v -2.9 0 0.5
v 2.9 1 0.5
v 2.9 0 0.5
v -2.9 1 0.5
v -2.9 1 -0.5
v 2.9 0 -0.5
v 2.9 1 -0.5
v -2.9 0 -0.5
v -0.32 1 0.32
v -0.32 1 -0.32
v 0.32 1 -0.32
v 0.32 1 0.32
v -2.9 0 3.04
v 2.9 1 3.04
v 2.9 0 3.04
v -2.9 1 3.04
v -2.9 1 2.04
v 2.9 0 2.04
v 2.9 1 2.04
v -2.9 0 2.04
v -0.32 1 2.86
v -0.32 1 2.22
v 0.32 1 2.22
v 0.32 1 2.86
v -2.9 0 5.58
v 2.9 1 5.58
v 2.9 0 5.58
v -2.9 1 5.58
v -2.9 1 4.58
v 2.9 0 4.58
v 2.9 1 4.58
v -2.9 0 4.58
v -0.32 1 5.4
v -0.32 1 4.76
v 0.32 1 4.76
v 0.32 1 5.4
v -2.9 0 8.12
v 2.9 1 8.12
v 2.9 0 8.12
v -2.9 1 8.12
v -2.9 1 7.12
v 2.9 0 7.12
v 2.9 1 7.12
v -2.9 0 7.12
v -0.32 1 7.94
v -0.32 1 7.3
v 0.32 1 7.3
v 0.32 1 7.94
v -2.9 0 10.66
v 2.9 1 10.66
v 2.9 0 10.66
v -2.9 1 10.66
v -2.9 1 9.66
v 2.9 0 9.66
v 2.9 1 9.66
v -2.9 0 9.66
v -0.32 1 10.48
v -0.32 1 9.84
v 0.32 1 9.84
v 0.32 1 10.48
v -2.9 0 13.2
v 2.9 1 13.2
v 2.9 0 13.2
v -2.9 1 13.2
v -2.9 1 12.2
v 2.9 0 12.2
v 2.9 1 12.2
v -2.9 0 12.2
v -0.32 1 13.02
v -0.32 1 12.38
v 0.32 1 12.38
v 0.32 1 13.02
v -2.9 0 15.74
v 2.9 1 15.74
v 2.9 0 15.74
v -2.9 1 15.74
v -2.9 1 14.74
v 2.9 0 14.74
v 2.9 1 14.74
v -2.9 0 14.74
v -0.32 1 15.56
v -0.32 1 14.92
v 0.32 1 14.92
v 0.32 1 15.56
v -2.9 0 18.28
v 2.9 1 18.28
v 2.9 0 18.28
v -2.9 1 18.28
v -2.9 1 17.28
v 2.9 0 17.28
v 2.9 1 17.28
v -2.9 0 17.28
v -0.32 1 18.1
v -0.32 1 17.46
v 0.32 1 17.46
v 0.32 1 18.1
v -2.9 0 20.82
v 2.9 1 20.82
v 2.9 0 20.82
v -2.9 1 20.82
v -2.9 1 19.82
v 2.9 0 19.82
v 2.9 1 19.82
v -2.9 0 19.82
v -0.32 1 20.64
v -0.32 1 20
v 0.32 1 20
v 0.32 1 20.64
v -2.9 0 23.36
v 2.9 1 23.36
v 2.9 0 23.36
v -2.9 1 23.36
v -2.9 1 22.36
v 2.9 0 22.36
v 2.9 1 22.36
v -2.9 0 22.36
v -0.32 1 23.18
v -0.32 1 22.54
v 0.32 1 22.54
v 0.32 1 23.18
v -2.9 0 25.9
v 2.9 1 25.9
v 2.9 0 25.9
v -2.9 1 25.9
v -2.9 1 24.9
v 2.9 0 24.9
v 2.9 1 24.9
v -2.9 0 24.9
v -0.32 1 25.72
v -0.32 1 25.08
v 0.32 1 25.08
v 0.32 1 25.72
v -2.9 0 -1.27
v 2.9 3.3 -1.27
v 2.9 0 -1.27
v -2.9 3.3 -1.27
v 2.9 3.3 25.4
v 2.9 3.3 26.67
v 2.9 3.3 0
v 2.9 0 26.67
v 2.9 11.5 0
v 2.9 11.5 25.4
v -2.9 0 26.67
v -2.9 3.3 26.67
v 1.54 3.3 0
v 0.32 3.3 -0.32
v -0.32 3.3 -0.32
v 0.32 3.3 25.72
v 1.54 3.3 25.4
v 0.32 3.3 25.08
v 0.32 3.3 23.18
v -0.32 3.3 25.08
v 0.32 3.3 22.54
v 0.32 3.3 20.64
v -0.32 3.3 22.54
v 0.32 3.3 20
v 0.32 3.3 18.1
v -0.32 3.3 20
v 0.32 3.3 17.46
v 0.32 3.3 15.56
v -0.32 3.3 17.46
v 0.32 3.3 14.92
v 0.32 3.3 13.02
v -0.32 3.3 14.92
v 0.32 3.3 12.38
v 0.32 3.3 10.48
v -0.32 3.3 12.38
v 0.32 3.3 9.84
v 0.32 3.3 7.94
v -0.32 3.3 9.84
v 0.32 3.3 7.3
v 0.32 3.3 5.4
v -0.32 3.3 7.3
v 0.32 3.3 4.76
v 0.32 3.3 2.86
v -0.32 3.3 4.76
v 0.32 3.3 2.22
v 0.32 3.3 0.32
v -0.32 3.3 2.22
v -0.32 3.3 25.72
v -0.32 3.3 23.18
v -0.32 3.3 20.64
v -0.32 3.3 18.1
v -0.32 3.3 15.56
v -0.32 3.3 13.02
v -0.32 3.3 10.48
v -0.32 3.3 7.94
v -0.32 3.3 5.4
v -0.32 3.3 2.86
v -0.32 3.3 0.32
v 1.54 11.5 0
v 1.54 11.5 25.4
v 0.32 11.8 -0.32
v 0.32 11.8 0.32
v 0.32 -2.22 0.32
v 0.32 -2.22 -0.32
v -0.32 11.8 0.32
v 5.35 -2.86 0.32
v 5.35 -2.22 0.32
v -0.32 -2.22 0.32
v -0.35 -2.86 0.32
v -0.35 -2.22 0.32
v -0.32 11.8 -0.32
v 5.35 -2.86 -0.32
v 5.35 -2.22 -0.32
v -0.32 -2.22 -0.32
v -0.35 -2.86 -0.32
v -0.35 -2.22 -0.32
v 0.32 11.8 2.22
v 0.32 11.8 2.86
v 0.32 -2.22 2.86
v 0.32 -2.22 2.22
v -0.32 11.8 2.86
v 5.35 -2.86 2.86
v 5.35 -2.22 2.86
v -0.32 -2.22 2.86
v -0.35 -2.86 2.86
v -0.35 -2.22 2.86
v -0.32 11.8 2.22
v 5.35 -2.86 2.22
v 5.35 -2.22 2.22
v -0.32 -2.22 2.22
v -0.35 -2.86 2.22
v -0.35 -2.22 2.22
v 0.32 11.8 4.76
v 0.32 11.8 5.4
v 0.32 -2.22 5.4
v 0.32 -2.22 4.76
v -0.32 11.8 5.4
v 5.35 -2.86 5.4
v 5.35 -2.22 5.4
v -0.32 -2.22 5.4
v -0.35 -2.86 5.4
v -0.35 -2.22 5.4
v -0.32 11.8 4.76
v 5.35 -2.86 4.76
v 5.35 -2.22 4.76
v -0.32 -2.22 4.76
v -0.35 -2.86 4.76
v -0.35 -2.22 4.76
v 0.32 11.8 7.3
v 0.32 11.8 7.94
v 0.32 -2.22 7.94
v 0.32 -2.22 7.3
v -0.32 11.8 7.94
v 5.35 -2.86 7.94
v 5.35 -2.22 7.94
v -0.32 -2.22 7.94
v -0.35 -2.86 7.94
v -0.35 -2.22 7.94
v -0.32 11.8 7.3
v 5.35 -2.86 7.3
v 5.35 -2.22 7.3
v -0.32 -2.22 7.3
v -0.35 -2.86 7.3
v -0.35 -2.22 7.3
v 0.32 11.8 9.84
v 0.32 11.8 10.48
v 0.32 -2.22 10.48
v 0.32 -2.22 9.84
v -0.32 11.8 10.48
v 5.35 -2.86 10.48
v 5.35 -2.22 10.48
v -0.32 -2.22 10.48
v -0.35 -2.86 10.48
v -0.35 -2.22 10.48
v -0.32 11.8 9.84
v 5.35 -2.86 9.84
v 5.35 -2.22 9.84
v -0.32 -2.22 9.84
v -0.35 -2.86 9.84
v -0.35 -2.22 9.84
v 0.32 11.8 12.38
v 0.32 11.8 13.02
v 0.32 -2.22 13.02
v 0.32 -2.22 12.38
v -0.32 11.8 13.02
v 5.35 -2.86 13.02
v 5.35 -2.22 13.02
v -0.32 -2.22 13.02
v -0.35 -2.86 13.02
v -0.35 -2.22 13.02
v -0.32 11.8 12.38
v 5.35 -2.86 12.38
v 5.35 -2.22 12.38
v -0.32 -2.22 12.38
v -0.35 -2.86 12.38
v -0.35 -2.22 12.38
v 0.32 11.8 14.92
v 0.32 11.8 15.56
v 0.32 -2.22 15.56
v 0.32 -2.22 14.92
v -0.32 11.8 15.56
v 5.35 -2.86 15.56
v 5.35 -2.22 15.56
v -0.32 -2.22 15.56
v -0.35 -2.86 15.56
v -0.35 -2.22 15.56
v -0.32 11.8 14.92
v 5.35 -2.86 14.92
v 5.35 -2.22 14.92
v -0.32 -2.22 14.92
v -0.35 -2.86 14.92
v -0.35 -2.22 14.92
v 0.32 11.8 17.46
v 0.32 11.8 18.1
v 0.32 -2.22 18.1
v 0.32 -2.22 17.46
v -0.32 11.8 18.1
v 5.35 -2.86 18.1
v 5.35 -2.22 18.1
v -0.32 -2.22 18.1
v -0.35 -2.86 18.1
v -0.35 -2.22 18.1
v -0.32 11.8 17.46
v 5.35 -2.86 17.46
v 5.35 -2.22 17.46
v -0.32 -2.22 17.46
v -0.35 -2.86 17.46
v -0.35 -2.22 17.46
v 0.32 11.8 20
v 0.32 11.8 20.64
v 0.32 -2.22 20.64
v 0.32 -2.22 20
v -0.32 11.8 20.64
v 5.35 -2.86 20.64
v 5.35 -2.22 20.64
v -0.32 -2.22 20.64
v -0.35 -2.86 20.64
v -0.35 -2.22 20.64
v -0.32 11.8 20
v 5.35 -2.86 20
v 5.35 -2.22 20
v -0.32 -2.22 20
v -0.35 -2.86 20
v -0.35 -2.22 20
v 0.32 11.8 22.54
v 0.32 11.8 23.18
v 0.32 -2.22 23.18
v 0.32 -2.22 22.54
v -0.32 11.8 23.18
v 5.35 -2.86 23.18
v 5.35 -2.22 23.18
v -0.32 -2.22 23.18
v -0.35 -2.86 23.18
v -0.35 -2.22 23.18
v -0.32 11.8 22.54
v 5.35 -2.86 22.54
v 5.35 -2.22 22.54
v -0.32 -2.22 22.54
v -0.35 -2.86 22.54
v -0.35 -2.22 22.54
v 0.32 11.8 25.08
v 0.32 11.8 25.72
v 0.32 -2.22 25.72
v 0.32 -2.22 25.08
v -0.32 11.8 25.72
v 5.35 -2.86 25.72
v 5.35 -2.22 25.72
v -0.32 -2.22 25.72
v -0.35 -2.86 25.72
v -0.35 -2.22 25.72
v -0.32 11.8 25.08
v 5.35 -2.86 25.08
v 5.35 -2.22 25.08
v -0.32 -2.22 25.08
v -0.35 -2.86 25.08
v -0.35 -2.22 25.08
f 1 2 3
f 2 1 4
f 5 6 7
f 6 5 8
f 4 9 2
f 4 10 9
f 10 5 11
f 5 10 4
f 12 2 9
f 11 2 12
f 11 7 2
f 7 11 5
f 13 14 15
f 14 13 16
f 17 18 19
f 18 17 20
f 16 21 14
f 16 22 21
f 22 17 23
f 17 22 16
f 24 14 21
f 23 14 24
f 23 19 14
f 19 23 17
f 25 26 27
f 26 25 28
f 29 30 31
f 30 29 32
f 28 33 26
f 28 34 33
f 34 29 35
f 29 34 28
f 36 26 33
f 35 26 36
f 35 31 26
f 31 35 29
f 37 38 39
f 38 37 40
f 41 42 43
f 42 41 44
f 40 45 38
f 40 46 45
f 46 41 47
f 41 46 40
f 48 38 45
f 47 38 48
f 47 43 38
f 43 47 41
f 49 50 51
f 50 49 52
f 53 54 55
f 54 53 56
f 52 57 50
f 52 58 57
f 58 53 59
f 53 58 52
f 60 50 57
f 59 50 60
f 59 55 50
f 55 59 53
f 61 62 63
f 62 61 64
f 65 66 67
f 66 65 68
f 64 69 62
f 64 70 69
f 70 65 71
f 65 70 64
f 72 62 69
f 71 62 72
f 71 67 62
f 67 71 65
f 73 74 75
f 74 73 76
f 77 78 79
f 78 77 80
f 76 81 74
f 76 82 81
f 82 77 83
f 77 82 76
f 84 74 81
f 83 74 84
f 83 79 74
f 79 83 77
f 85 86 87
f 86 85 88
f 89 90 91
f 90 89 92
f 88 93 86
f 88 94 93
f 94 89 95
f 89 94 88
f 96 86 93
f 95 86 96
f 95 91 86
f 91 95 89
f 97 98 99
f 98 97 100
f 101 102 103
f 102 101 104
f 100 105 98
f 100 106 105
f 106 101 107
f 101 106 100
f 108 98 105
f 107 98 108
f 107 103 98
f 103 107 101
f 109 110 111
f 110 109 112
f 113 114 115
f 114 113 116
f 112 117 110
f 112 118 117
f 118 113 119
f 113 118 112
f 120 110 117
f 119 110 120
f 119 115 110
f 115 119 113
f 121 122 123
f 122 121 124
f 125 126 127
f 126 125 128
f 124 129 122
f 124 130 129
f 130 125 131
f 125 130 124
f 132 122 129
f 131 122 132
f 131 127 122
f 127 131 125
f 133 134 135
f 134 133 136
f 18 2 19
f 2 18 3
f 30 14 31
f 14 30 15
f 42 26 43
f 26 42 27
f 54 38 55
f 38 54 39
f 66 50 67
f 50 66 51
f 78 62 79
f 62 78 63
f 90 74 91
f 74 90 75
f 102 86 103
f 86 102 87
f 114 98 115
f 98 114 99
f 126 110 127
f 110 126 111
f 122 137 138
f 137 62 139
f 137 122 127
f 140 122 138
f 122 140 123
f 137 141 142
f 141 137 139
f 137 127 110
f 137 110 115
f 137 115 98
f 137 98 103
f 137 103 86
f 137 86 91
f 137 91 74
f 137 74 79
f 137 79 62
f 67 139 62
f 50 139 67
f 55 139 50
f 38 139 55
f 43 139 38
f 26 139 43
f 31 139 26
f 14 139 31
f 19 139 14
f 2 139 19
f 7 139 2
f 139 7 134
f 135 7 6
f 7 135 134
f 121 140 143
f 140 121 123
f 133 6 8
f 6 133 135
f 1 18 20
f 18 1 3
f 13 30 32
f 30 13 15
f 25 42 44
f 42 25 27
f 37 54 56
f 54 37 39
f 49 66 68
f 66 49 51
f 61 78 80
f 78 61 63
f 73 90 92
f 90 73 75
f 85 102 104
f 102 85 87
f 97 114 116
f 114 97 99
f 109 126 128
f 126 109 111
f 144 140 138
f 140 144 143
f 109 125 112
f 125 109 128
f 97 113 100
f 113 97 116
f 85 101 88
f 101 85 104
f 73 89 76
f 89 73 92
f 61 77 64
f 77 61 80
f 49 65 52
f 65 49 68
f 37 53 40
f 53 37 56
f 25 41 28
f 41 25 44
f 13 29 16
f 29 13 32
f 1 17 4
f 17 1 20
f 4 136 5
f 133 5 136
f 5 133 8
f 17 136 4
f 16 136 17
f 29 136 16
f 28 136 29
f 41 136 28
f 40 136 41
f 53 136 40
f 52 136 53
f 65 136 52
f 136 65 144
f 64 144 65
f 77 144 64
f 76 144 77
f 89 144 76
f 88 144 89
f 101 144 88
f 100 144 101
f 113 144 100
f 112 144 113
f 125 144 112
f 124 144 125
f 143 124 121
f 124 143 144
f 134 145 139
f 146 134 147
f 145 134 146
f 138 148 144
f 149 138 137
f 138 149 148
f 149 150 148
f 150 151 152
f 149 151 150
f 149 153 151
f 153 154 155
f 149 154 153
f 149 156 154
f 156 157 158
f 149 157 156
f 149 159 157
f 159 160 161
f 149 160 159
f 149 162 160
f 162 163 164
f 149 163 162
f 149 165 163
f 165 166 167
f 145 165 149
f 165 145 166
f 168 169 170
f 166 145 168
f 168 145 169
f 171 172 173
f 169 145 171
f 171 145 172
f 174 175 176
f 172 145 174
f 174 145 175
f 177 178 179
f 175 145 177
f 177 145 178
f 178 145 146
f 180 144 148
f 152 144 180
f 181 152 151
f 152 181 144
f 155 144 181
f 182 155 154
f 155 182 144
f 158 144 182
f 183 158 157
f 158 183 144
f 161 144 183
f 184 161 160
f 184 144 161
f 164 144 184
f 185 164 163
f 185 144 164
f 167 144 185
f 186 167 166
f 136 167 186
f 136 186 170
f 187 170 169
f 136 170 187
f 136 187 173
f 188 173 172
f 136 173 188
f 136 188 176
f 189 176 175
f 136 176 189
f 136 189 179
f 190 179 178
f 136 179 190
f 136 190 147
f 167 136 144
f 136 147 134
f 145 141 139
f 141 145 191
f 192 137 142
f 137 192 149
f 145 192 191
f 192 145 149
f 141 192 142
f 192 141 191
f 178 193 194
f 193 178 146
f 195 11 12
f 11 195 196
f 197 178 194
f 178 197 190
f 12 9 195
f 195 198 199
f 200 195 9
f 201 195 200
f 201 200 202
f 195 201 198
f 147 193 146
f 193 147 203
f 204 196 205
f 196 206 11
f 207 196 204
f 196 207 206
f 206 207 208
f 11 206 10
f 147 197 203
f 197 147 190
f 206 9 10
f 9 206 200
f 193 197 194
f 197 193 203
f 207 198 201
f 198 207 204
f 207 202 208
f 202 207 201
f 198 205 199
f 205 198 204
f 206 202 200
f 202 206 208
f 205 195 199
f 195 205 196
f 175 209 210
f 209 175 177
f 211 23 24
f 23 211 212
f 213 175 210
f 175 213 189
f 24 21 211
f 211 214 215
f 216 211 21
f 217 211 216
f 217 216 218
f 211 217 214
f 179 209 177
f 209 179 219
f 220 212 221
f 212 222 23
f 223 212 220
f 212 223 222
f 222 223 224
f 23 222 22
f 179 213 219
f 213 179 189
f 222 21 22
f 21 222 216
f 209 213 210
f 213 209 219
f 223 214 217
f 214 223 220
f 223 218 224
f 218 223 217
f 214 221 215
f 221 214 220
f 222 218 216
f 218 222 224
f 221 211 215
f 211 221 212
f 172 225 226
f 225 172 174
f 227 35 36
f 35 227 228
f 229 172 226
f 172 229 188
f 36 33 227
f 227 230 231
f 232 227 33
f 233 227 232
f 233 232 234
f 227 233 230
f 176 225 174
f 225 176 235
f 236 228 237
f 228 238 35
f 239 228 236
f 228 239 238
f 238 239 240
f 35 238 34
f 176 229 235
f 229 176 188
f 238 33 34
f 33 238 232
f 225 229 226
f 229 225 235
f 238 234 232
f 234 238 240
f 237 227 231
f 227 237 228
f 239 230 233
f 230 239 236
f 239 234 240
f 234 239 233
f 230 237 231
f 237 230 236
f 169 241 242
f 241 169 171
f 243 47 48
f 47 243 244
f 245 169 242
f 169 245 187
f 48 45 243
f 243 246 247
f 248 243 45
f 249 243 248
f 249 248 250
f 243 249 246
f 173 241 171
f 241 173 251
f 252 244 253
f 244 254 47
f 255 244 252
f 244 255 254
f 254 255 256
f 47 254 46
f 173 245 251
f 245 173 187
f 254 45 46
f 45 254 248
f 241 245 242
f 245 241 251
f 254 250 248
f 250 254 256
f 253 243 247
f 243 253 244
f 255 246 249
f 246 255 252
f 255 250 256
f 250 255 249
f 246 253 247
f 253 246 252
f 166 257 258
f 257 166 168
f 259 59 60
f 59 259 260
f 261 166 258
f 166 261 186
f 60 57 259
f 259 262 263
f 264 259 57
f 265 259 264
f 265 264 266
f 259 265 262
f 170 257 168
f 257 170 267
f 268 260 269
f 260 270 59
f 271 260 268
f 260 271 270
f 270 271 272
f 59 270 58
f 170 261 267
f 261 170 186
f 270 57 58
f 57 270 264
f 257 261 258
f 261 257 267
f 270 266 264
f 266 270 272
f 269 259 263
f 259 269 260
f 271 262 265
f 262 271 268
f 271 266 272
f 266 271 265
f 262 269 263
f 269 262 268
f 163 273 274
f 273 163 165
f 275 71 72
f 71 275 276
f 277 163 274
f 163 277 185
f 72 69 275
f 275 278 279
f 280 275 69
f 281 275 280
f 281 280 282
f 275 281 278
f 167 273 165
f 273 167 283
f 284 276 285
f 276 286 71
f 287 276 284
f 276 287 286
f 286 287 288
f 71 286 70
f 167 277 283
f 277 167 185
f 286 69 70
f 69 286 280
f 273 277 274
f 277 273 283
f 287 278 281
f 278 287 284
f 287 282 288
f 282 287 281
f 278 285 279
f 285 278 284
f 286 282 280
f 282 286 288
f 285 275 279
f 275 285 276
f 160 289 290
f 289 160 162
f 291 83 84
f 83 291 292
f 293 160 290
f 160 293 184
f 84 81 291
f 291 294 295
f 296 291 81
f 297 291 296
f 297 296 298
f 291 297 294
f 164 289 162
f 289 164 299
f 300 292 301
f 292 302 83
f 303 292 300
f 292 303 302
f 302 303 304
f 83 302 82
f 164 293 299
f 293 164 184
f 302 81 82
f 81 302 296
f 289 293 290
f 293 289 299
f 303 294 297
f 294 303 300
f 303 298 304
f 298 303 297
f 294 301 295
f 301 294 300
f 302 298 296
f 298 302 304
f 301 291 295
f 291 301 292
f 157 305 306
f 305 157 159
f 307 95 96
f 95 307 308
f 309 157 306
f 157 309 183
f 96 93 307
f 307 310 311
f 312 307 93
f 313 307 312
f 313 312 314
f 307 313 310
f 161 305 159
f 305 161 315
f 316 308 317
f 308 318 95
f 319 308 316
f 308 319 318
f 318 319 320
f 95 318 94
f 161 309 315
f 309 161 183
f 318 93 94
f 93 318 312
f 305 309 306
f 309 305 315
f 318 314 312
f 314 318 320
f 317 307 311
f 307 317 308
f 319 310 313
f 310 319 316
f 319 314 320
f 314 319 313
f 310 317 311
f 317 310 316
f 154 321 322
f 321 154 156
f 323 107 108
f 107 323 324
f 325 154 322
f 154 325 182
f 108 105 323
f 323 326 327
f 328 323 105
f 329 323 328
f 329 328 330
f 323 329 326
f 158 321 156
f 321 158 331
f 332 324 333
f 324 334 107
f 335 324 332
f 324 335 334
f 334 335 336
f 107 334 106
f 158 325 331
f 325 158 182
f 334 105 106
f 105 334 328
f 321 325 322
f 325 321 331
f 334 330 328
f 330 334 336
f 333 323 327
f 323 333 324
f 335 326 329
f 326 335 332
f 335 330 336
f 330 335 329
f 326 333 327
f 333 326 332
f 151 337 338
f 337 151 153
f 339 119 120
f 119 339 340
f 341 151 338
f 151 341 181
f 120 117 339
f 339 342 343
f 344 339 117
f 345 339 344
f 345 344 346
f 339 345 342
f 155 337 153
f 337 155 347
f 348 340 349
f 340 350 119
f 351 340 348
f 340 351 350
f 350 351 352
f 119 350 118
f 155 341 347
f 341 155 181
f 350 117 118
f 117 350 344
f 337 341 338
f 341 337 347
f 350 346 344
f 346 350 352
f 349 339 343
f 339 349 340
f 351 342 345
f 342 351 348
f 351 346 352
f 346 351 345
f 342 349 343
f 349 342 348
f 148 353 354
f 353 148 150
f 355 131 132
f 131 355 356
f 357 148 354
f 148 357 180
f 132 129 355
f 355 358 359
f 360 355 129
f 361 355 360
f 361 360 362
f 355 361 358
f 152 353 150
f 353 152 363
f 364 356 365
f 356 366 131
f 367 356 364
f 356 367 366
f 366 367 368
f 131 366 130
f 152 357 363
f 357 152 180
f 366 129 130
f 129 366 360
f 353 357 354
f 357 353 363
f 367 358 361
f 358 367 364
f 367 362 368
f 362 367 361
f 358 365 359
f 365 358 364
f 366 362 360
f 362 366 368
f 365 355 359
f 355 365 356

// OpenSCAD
// cylinder($fn = 0, $fa = 12, $fs = 2, h = 20, r1 = 10, r2 = 5, center = false);
// cube(size=[5, 2, 10], center=true);
// color("red")translate([0, 0, -1.27]) linear_extrude(1.27) polygon(points=points);
// color("red")translate([0, 0, -2.9]) linear_extrude(2.54) polygon(points=points);
// color("red") translate([0, 0, 2.54 * i]) translate([0, 0, -2.9]) linear_extrude(1.27) polygon(points=points);

//this is library for: http://www.tme.eu/pl/details/ns25-w5k/zlacza-sygnalowe-raster-254mm/ninigi/
//based on documentation: http://www.tme.eu/pl/Document/f4fbc03349849389d5a444932ab1e0cf/ns25-w2p.pdf 

/// i - number of pins
/// angle - version of pin:
///    " 0" - straight
///    "-1" - right angle
///    " 1" - reverse right angle
module Connector402(i, angle)
{
    color("red")_body(i);
    color("gray")_pin(i, angle);
}

    plastic_color = [245/255, 249/255, 201/255];
    // color(plastic_color) {}
    // points=[[2.9,0],[2.9,11.5],[1.54,11.5],[1.54,3.3],[-2.9,3.3],[-2.9,0]];

module _body(i)
{
    _bottom=[[2.9,0],[2.9,3.3],[-2.9,3.3],[-2.9,0]];
    _top=[[2.9,3.3],[2.9,11.5],[1.54,11.5],[1.54,3.3]];

     linear_extrude(2.54*i) polygon(points=_top);
     difference()
     {
     translate([0, 0,-1.27]) linear_extrude(2.54*(i+1)) polygon(points=_bottom);
     for (i=[0:i]) translate([0, 0, 2.54 * i])cube([6,2,1], center = true);
     }

}


// wycięcia na końcach
         //   translate([1, 3.3, 2.54 * i - 2.54]) cube([6,10,2]);
         //    translate([1, 3.3, -2])cube([6,10,2.01]);

    
// goldpin(i, angle);


module _pin(i, angle)
{
    for (i=[0:i]) 
    {

translate([0, 0, 2.54 * i])
{

        color("gray") translate([0, 4.7, 0]) cube([0.64,14.2,0.64], center = true);
        if(angle != 0)color("gray") rotate([0, 0, 90])
         translate([-2.54, -2.5*angle, 0]) cube([0.64,2.4+3.3,0.64], center = true);
}
    }

}

// pin(10,0);
Connector402(10,1);



/*

module any()
{

    
            difference()
        {
            translate([0, 0,-1.27]) linear_extrude(2.54*i) polygon(points=points);
for (i=[0:i-1]) 
{
    translate([0, 0, 2.54 * i])
    {
        difference()
        {
            cube([6,2,1], center = true);
        }
    }
}
        }

        */
